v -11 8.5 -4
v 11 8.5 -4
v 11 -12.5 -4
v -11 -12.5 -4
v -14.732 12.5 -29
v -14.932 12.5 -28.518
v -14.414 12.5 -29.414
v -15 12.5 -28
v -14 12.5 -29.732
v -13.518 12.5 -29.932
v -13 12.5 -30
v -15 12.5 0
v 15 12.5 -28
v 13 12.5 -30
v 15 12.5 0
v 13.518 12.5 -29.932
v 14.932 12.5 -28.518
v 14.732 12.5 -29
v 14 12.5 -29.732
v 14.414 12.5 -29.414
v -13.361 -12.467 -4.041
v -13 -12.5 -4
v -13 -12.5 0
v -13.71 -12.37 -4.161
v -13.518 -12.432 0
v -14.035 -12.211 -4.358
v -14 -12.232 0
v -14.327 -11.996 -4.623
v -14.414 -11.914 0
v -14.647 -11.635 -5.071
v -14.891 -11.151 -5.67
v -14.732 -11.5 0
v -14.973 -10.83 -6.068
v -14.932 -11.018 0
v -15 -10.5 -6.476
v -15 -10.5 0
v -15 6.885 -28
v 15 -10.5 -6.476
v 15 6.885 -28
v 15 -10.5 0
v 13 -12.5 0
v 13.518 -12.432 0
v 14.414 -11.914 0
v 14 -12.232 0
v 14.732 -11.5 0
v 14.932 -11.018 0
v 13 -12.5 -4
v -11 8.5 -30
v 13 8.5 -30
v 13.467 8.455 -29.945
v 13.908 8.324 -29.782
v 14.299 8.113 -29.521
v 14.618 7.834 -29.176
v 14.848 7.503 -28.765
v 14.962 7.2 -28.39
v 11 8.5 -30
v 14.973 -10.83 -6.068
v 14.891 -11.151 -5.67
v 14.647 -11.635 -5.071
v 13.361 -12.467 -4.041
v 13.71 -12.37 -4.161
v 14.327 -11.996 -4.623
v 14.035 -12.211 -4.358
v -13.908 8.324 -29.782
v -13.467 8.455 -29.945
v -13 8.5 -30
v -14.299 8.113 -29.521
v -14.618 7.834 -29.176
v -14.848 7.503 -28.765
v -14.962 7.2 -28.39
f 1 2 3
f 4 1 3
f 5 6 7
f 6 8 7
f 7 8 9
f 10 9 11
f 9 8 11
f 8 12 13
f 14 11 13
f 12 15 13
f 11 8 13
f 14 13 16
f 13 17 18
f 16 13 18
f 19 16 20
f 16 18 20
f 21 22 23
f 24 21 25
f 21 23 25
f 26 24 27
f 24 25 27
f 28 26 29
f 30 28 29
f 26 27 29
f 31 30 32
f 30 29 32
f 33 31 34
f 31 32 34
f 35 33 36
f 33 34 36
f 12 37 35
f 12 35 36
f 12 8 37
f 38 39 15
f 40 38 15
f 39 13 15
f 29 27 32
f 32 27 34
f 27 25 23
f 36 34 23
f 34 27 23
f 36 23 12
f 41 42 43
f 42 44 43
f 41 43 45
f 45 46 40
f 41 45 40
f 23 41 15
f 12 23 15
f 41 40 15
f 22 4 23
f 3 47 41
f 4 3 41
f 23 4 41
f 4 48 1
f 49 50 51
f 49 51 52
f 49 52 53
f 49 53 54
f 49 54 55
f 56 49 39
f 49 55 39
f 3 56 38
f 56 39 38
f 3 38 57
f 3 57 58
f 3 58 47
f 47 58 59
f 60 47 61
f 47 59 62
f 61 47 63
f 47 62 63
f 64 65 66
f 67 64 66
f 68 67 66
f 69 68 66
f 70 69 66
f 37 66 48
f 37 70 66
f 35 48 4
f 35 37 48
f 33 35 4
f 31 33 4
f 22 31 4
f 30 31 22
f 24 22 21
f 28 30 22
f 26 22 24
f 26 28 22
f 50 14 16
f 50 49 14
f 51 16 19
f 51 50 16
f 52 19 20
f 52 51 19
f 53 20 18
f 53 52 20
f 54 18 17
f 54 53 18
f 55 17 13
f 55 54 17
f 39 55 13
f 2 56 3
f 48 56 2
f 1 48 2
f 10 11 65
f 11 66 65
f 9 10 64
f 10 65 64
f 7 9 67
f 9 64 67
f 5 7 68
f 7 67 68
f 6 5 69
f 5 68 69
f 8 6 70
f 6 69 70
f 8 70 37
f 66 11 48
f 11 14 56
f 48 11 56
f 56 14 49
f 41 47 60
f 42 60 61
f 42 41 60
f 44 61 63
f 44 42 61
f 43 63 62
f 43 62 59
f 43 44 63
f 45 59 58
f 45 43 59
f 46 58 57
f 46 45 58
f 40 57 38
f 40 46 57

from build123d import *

# Parameters (mm, degrees)
BOSS_EXTRUDE1_DEPTH = 15
BOSS_EXTRUDE2_DEPTH = 4
FILLET1_R           = 2


with BuildPart() as part:
    # Sketch1 → Boss-Extrude1 (new body, symmetric)
    with BuildSketch(Plane(origin=(0, 0, 0), x_dir=(0, 0, -1), z_dir=(1, 0, 0))):
        Polygon((0, -12.5), (0, 12.5), (30, 12.5), (30, 8.5), (4, 8.5), (4, -12.5), align=None)
    extrude(amount=BOSS_EXTRUDE1_DEPTH, both=True)

    # Sketch2 → Boss-Extrude2 (add)
    with BuildSketch(Plane(origin=(15, 0, 0), x_dir=(0, 0, -1), z_dir=(1, 0, 0))):
        Polygon((30, 8.5), (4, -12.5), (4, 8.5), align=None)
    boss_extrude2 = extrude(amount=-BOSS_EXTRUDE2_DEPTH)

    # Mirror1: Boss-Extrude2 across plane
    add(boss_extrude2.mirror(Plane(origin=(0, 0, 0), x_dir=(0, 0, 1), z_dir=(1, 0, 0))))

    # Fillet1
    fillet1_edges = [part.edges().sort_by_distance(p)[0] for p in [
        (15, -12.5, -2),
        (15, 10.5, -30),
        (-15, -12.5, -2),
        (-15, 10.5, -30),
    ]]
    fillet(fillet1_edges, radius=FILLET1_R)


solid = part.part
